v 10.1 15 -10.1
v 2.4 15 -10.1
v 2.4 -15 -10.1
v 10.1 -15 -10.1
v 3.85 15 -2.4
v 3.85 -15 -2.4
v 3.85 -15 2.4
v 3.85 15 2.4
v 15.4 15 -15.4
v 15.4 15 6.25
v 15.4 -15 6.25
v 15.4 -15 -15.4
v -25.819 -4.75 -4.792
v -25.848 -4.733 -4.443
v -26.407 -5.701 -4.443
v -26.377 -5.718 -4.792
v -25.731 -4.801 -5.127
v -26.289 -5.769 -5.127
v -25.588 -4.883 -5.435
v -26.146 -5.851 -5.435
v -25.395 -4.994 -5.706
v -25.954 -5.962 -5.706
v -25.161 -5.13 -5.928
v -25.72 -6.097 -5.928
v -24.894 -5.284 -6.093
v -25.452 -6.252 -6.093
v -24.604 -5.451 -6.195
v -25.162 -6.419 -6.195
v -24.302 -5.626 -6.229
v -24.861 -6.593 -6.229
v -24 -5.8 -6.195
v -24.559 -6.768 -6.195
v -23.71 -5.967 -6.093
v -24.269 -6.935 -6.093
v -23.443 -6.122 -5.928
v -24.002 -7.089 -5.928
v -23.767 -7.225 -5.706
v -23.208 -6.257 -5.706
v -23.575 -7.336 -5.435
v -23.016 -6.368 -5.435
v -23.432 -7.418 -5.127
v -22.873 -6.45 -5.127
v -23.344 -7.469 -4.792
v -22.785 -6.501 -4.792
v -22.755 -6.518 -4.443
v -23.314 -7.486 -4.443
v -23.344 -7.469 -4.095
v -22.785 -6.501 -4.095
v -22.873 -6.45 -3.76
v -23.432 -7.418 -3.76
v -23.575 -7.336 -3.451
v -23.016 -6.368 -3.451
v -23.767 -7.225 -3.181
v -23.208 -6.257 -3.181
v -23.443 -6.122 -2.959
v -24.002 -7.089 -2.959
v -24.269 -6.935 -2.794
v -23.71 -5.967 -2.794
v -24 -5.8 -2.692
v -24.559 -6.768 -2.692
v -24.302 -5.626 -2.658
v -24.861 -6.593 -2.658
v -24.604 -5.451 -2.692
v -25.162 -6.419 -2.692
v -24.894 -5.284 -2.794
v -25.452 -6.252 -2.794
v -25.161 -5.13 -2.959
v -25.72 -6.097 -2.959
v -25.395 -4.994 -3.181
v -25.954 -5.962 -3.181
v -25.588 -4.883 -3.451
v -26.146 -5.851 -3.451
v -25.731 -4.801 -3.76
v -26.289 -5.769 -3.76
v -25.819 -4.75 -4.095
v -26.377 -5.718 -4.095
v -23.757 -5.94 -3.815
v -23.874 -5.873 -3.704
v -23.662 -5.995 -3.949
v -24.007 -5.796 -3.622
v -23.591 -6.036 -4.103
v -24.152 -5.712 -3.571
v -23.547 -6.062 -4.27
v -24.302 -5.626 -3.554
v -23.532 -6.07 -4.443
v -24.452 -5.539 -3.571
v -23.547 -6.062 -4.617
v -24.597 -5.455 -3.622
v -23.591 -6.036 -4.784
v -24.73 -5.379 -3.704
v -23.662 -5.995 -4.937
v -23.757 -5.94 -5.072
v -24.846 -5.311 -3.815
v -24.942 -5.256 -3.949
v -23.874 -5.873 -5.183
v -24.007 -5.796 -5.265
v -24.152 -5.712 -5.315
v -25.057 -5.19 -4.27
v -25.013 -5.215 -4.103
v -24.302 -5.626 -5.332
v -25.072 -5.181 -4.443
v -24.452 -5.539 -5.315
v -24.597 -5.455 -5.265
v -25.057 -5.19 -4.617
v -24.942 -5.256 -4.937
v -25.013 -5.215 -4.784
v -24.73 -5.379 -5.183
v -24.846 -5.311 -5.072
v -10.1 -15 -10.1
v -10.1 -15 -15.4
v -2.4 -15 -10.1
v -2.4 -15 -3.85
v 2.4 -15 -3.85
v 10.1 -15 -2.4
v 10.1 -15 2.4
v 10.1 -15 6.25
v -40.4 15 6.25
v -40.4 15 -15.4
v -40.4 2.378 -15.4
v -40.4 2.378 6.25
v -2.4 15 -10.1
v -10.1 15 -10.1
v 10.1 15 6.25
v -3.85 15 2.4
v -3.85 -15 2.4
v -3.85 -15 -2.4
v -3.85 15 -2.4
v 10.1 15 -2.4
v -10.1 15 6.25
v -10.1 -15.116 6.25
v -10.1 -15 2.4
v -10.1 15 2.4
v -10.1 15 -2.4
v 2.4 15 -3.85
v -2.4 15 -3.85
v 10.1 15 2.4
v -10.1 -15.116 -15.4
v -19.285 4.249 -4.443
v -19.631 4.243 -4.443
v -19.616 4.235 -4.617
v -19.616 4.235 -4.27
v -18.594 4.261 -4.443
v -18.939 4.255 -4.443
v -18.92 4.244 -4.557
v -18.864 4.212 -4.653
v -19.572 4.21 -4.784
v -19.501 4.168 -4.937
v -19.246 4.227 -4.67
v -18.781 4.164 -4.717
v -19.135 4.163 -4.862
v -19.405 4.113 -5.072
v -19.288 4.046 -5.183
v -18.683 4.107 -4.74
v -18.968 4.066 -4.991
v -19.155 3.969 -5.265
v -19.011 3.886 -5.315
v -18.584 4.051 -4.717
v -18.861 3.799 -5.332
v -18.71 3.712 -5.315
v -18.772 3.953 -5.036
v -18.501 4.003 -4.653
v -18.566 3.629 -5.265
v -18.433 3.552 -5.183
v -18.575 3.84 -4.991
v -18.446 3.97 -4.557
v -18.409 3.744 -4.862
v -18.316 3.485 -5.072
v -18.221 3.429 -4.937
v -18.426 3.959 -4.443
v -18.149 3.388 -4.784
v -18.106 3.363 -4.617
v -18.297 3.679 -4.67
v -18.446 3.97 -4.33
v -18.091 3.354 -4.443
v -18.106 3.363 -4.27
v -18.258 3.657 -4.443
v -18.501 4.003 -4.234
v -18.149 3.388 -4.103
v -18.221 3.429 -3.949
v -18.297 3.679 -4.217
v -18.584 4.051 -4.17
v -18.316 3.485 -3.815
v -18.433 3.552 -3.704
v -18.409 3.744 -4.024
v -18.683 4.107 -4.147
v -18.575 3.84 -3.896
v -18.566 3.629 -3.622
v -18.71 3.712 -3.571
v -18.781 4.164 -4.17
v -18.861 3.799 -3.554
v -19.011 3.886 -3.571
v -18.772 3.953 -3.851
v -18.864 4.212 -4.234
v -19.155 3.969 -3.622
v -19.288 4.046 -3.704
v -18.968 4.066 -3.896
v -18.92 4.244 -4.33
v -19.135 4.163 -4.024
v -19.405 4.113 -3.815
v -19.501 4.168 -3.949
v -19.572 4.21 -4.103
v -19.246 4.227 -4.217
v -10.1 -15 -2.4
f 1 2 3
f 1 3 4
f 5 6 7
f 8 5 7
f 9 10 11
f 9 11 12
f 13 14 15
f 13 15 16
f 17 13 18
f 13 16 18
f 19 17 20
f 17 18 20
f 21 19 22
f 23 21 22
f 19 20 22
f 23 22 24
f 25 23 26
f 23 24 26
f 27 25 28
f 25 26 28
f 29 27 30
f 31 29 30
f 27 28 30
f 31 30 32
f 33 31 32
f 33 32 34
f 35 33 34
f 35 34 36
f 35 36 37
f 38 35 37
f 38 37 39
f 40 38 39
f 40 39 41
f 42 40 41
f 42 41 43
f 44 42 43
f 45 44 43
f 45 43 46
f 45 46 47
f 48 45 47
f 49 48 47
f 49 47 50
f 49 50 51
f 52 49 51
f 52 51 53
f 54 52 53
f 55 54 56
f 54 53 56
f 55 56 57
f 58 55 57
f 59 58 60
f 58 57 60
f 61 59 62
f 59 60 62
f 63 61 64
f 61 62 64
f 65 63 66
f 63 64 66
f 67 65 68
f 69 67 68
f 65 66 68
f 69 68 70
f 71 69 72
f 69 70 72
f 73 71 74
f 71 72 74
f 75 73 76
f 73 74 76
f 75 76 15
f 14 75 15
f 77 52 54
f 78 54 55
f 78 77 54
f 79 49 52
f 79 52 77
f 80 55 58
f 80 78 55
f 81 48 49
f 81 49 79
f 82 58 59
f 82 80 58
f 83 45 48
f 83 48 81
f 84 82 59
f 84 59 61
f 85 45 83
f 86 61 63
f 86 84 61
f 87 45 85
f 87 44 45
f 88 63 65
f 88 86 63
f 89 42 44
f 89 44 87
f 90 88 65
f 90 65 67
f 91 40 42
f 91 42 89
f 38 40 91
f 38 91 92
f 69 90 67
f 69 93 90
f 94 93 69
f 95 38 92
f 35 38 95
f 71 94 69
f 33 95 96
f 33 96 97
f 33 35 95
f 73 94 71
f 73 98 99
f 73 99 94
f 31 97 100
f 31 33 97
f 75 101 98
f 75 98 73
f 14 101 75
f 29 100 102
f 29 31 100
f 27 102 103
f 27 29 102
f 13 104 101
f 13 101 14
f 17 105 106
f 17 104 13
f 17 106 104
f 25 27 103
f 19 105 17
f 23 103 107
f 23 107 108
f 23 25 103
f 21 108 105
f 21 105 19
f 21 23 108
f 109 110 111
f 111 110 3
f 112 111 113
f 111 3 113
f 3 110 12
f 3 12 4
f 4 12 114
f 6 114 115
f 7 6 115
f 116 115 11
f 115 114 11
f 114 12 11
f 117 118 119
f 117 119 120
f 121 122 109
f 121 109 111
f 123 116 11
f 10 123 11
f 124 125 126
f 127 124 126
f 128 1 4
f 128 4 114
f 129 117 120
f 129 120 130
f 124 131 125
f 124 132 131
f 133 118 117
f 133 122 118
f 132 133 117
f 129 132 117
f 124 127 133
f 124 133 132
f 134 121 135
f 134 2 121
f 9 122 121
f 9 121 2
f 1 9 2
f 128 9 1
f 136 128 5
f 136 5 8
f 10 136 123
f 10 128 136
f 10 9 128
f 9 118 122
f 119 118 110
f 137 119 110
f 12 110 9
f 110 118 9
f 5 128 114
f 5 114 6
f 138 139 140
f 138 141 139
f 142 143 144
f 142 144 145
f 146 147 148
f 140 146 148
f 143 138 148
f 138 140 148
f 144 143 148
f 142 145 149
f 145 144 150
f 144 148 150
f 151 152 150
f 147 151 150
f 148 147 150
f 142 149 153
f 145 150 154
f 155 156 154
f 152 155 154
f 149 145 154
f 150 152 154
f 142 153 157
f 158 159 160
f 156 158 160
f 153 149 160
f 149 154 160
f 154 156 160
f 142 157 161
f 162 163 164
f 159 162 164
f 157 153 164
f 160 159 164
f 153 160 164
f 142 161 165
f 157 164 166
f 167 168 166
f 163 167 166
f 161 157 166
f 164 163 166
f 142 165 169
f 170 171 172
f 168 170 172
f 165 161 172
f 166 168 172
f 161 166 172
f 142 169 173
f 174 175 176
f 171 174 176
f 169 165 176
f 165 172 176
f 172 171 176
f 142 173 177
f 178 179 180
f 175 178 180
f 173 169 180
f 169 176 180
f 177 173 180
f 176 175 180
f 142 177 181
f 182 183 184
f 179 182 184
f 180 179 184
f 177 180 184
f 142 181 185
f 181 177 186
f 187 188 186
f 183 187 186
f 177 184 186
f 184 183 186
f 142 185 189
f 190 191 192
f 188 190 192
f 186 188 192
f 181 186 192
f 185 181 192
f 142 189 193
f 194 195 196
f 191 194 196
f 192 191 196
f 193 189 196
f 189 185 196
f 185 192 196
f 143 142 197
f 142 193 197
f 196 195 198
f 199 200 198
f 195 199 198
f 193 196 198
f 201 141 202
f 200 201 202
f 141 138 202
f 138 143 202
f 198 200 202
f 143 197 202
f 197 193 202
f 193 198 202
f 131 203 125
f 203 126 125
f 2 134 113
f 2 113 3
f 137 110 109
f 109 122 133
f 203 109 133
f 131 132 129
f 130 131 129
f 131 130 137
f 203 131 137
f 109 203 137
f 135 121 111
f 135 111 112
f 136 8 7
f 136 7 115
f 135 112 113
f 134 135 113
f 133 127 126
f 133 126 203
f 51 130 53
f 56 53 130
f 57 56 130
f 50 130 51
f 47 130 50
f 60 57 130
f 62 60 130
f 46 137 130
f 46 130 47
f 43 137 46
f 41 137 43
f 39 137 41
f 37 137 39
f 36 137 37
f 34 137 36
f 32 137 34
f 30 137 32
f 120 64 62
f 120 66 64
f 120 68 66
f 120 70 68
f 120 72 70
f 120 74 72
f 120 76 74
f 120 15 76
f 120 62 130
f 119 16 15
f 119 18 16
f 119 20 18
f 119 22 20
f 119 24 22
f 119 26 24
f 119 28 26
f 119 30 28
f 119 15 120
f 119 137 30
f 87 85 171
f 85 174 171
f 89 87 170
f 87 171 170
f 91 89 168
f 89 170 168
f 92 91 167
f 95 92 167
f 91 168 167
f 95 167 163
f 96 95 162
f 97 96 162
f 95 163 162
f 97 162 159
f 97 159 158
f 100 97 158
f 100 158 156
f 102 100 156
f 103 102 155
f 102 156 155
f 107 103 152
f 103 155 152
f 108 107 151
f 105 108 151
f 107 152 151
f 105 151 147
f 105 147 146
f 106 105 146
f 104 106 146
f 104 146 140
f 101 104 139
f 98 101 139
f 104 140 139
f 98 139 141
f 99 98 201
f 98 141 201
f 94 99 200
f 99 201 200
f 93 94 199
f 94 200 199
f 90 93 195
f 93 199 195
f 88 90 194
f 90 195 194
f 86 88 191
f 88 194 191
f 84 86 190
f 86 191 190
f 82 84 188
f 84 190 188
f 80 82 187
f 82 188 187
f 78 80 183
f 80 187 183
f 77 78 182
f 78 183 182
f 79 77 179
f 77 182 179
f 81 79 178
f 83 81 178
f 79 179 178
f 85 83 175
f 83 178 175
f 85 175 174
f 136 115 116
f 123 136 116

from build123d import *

# Parameters (mm, degrees)
BOSS_EXTRU_1_DEPTH                               = 15
ESQUISSE1_W                                      = 21.65
ESQUISSE1_H                                      = 30
BOSS_EXTRU_2_DEPTH                               = 25
ESQUISSE3_W                                      = 30.3
ESQUISSE3_H                                      = 21.65
BOSS_EXTRU_3_DEPTH                               = 25
ENL_V_MAT_EXTRU_2_DEPTH                          = 61.834878976
ENL_V_MAT_EXTRU_2_DEPTH_BACK                     = 61.834878976
CHAMBRAGE_POUR_VIS_T_TE_RONDE_BOMB_E_D           = 1.778
CHAMBRAGE_POUR_VIS_T_TE_RONDE_BOMB_E_DEPTH       = 12
CHAMBRAGE_POUR_VIS_T_TE_RONDE_BOMB_E_CBORE_D     = 3.57124
CHAMBRAGE_POUR_VIS_T_TE_RONDE_BOMB_E_CBORE_DEPTH = 1.1176
CHAMBRAGE_POUR_VIS_T_TE_RONDE_BOMB_E_TIP         = 0.53416509


with BuildPart() as part:
    # Base → Boss.-Extru.1 (new, symmetric)
    with BuildSketch(Plane(origin=(0, 0, 0), x_dir=(1, 0, 0), z_dir=(0, 1, 0))):
        Polygon((-3.85, -2.4), (-3.85, 2.4), (-10.1, 2.4), (-10.1, 10.1), (-2.4, 10.1), (-2.4, 3.85), (2.4, 3.85), (2.4, 10.1), (10.1, 10.1), (10.1, 2.4), (3.85, 2.4), (3.85, -2.4), (10.1, -2.4), (10.1, -6.25), (15.4, -6.25), (15.4, 15.4), (-15.4, 15.4), (-15.4, -6.25), (-10.1, -6.25), (-10.1, -2.4), align=None)
    extrude(amount=BOSS_EXTRU_1_DEPTH, both=True)

    # Esquisse1 → Boss.-Extru.2 (add)
    with BuildSketch(Plane.ZY.offset(15.4)):
        with Locations((-4.575, 0)):
            Rectangle(ESQUISSE1_W, ESQUISSE1_H)
    extrude(amount=BOSS_EXTRU_2_DEPTH)

    # Esquisse3 → Boss.-Extru.3 (add)
    with BuildSketch(Plane.XZ.offset(15)):
        with Locations((-25.25, -4.575)):
            Rectangle(ESQUISSE3_W, ESQUISSE3_H)
    extrude(amount=BOSS_EXTRU_3_DEPTH)

    # Esquisse4 → Enlèv. mat.-Extru.2 (cut, two sides: drawn at the far end of the back side and taken through both)
    with BuildSketch(Plane.XY.offset(6.25).offset(-ENL_V_MAT_EXTRU_2_DEPTH_BACK)):
        Polygon((119.921926151, -90.183707408), (-10.1, -15.115513344), (-40.4, 2.378199813), (-170.421926151, 77.446393876), (-320.558314278, -182.597458425), (-30.214461977, -350.227559709), align=None)
    extrude(amount=ENL_V_MAT_EXTRU_2_DEPTH + ENL_V_MAT_EXTRU_2_DEPTH_BACK, mode=Mode.SUBTRACT)

    # Chambrage pour vis à tête ronde bombée #02
    with Locations(Plane(origin=(-9.070209274, -15.710063297, 0), x_dir=(-0.8660254037844364, 0.5000000000000041, 0), z_dir=(-0.500000000000004, -0.8660254037844363, 0))):
        with Locations((18.233273003, 4.443374623)):
            CounterBoreHole(CHAMBRAGE_POUR_VIS_T_TE_RONDE_BOMB_E_D / 2, CHAMBRAGE_POUR_VIS_T_TE_RONDE_BOMB_E_CBORE_D / 2, CHAMBRAGE_POUR_VIS_T_TE_RONDE_BOMB_E_CBORE_DEPTH, depth=CHAMBRAGE_POUR_VIS_T_TE_RONDE_BOMB_E_DEPTH)
            with Locations((0, 0, -(CHAMBRAGE_POUR_VIS_T_TE_RONDE_BOMB_E_DEPTH + CHAMBRAGE_POUR_VIS_T_TE_RONDE_BOMB_E_TIP / 2))):  # 118° drill point
                Cone(0, CHAMBRAGE_POUR_VIS_T_TE_RONDE_BOMB_E_D / 2, CHAMBRAGE_POUR_VIS_T_TE_RONDE_BOMB_E_TIP, mode=Mode.SUBTRACT)


solid = part.part
